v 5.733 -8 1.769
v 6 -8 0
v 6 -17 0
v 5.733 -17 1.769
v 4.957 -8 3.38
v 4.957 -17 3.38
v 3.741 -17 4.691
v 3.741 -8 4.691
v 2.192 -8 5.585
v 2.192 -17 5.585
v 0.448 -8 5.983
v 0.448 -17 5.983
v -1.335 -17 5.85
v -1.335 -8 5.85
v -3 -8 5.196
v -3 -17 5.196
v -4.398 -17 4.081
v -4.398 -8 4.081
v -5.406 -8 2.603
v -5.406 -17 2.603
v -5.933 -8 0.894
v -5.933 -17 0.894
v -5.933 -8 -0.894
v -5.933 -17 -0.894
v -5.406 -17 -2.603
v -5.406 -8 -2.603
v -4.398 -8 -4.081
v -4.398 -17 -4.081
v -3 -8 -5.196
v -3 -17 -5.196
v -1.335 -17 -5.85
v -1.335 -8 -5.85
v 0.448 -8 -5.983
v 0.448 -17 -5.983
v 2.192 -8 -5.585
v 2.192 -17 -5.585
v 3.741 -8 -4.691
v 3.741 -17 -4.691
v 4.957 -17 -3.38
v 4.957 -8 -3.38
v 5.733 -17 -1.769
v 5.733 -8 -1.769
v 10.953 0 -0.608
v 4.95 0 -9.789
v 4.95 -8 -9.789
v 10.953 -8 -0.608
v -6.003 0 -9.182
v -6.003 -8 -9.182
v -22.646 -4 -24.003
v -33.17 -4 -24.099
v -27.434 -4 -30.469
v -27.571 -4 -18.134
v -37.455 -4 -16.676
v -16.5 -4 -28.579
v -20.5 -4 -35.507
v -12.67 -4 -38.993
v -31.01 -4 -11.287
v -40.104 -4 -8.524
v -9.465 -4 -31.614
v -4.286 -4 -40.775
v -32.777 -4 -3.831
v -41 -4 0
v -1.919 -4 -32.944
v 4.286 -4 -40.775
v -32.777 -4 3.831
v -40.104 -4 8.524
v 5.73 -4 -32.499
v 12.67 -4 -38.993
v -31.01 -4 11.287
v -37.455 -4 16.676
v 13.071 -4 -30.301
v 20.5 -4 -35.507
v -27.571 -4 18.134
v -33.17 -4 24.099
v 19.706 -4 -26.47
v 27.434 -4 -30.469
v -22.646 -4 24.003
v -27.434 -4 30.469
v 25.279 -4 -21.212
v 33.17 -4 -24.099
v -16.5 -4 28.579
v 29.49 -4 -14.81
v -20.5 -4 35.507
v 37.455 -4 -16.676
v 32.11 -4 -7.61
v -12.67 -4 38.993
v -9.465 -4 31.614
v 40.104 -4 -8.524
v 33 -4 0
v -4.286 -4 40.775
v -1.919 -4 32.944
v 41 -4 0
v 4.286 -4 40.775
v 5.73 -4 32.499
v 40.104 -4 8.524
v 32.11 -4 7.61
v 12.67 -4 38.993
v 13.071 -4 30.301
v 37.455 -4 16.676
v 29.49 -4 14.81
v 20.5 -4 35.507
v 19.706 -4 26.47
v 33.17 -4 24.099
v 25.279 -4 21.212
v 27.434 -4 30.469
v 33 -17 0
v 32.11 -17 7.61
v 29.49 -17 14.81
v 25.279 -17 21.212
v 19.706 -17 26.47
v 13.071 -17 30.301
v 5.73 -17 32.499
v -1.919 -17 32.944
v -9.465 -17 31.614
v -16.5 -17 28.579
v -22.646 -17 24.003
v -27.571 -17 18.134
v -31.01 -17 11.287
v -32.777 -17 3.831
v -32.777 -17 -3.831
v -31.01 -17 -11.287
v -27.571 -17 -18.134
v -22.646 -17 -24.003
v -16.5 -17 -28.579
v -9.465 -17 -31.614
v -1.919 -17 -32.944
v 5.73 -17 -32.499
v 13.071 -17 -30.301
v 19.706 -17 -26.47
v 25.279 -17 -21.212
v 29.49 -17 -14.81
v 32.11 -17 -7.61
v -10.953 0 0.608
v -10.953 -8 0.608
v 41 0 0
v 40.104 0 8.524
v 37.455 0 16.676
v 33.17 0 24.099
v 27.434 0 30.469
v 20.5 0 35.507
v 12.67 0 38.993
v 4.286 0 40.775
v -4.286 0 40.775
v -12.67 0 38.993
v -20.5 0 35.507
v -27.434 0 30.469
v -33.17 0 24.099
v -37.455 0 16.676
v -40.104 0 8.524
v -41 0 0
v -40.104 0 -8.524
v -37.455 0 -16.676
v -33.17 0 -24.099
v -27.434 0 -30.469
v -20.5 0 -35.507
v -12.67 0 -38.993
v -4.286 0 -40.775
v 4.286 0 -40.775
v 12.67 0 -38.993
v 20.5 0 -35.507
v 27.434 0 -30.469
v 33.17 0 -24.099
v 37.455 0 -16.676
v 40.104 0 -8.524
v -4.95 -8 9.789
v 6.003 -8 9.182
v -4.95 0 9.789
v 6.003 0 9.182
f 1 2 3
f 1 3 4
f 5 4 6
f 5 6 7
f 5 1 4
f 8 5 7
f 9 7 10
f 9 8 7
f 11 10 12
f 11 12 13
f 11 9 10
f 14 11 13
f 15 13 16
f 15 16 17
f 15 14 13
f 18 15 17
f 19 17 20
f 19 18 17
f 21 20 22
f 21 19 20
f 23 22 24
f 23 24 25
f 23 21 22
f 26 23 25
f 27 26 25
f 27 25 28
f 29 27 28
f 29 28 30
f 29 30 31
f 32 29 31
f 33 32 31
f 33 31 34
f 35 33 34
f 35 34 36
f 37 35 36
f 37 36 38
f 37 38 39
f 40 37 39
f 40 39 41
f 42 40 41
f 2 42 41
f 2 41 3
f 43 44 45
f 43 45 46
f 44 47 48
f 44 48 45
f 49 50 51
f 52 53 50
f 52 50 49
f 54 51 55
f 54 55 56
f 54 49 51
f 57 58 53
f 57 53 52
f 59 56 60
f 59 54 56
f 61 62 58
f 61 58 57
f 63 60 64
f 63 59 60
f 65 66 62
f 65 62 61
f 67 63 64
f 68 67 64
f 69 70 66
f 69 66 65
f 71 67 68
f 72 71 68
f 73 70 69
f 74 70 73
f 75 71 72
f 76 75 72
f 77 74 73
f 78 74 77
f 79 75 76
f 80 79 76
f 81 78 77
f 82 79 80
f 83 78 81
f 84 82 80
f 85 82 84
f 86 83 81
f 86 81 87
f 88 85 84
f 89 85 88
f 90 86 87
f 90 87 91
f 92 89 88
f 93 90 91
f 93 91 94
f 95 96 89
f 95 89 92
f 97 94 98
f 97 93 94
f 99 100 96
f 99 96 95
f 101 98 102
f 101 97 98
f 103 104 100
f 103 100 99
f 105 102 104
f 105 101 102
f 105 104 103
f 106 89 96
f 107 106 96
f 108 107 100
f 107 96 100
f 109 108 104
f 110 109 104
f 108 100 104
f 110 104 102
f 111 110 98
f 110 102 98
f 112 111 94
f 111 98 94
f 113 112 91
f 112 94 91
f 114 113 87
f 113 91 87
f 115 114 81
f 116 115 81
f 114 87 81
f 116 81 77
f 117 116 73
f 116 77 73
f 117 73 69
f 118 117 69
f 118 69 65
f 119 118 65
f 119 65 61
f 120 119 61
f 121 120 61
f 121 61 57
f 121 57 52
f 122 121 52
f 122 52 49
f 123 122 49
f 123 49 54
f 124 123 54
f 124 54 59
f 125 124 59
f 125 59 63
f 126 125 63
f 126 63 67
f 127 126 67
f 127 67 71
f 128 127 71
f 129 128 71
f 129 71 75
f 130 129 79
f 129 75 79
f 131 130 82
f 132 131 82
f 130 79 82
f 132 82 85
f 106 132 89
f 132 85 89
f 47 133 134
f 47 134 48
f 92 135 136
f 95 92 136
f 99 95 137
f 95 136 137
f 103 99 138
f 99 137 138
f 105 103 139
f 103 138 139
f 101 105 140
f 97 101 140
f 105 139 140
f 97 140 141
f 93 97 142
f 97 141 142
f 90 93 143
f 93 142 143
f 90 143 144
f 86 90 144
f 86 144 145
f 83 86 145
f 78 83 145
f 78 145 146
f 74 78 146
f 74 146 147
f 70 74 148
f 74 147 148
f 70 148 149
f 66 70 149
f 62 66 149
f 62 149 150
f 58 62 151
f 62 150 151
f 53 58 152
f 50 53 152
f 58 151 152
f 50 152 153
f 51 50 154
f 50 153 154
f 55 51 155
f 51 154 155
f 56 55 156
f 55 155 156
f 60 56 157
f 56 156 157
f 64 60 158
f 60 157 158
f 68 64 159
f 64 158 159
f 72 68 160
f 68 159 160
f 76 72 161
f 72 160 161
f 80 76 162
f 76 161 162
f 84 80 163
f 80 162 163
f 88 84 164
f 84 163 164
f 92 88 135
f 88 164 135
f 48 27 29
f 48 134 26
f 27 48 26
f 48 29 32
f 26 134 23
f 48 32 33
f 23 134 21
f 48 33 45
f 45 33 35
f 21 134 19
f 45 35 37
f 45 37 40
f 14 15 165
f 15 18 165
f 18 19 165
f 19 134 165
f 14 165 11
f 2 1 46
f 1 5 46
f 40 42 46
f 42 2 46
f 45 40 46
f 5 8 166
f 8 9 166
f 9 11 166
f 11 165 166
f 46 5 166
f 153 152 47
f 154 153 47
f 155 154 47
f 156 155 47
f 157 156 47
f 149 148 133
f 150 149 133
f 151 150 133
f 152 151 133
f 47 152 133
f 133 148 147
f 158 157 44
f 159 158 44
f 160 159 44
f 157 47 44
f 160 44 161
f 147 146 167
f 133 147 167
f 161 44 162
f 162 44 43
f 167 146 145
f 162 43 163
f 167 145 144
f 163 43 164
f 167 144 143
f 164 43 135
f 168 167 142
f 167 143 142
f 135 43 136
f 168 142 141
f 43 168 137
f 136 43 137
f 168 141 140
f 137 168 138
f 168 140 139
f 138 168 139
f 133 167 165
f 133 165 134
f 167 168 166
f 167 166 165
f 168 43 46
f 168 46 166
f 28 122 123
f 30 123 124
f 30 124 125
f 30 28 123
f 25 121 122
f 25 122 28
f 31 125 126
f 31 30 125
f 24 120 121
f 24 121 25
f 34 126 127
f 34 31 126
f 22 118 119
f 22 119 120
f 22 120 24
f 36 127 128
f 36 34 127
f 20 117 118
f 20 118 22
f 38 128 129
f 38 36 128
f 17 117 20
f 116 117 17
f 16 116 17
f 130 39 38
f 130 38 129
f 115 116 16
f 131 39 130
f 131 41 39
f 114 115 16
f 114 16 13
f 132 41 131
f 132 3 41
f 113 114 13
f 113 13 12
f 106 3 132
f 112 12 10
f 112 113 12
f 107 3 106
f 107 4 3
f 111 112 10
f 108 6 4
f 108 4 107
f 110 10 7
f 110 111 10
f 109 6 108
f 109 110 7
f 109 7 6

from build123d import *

# Parameters (mm, degrees)
F0_R     = 41
F0_R_2   = 33
F2_DEPTH = 4
F1_R     = 33
F1_R_2   = 6
F3_DEPTH = 17
F4_R     = 6
F5_DEPTH = 8


with BuildPart() as f2:
    # F0 (on Front) → F2 (new body)
    with BuildSketch(Plane.XZ):
        Circle(F0_R)
        Circle(F0_R_2, mode=Mode.SUBTRACT)
    extrude(amount=F2_DEPTH)

    # F1 (on Front) → F3 (join)
    with BuildSketch(Plane.XZ):
        Circle(F1_R)
        Circle(F1_R_2, mode=Mode.SUBTRACT)
    extrude(amount=F3_DEPTH)

    # F4 (on Front) → F5 (cut)
    with BuildSketch(Plane.XZ):
        Polygon((-10.952806, 0.607765), (-6.002742, -9.181526), (4.950063, -9.78929), (10.952806, -0.607765), (6.002742, 9.181526), (-4.950063, 9.78929), align=None)
        Circle(F4_R, mode=Mode.SUBTRACT)
    extrude(amount=F5_DEPTH, mode=Mode.SUBTRACT)


solid = f2.part
